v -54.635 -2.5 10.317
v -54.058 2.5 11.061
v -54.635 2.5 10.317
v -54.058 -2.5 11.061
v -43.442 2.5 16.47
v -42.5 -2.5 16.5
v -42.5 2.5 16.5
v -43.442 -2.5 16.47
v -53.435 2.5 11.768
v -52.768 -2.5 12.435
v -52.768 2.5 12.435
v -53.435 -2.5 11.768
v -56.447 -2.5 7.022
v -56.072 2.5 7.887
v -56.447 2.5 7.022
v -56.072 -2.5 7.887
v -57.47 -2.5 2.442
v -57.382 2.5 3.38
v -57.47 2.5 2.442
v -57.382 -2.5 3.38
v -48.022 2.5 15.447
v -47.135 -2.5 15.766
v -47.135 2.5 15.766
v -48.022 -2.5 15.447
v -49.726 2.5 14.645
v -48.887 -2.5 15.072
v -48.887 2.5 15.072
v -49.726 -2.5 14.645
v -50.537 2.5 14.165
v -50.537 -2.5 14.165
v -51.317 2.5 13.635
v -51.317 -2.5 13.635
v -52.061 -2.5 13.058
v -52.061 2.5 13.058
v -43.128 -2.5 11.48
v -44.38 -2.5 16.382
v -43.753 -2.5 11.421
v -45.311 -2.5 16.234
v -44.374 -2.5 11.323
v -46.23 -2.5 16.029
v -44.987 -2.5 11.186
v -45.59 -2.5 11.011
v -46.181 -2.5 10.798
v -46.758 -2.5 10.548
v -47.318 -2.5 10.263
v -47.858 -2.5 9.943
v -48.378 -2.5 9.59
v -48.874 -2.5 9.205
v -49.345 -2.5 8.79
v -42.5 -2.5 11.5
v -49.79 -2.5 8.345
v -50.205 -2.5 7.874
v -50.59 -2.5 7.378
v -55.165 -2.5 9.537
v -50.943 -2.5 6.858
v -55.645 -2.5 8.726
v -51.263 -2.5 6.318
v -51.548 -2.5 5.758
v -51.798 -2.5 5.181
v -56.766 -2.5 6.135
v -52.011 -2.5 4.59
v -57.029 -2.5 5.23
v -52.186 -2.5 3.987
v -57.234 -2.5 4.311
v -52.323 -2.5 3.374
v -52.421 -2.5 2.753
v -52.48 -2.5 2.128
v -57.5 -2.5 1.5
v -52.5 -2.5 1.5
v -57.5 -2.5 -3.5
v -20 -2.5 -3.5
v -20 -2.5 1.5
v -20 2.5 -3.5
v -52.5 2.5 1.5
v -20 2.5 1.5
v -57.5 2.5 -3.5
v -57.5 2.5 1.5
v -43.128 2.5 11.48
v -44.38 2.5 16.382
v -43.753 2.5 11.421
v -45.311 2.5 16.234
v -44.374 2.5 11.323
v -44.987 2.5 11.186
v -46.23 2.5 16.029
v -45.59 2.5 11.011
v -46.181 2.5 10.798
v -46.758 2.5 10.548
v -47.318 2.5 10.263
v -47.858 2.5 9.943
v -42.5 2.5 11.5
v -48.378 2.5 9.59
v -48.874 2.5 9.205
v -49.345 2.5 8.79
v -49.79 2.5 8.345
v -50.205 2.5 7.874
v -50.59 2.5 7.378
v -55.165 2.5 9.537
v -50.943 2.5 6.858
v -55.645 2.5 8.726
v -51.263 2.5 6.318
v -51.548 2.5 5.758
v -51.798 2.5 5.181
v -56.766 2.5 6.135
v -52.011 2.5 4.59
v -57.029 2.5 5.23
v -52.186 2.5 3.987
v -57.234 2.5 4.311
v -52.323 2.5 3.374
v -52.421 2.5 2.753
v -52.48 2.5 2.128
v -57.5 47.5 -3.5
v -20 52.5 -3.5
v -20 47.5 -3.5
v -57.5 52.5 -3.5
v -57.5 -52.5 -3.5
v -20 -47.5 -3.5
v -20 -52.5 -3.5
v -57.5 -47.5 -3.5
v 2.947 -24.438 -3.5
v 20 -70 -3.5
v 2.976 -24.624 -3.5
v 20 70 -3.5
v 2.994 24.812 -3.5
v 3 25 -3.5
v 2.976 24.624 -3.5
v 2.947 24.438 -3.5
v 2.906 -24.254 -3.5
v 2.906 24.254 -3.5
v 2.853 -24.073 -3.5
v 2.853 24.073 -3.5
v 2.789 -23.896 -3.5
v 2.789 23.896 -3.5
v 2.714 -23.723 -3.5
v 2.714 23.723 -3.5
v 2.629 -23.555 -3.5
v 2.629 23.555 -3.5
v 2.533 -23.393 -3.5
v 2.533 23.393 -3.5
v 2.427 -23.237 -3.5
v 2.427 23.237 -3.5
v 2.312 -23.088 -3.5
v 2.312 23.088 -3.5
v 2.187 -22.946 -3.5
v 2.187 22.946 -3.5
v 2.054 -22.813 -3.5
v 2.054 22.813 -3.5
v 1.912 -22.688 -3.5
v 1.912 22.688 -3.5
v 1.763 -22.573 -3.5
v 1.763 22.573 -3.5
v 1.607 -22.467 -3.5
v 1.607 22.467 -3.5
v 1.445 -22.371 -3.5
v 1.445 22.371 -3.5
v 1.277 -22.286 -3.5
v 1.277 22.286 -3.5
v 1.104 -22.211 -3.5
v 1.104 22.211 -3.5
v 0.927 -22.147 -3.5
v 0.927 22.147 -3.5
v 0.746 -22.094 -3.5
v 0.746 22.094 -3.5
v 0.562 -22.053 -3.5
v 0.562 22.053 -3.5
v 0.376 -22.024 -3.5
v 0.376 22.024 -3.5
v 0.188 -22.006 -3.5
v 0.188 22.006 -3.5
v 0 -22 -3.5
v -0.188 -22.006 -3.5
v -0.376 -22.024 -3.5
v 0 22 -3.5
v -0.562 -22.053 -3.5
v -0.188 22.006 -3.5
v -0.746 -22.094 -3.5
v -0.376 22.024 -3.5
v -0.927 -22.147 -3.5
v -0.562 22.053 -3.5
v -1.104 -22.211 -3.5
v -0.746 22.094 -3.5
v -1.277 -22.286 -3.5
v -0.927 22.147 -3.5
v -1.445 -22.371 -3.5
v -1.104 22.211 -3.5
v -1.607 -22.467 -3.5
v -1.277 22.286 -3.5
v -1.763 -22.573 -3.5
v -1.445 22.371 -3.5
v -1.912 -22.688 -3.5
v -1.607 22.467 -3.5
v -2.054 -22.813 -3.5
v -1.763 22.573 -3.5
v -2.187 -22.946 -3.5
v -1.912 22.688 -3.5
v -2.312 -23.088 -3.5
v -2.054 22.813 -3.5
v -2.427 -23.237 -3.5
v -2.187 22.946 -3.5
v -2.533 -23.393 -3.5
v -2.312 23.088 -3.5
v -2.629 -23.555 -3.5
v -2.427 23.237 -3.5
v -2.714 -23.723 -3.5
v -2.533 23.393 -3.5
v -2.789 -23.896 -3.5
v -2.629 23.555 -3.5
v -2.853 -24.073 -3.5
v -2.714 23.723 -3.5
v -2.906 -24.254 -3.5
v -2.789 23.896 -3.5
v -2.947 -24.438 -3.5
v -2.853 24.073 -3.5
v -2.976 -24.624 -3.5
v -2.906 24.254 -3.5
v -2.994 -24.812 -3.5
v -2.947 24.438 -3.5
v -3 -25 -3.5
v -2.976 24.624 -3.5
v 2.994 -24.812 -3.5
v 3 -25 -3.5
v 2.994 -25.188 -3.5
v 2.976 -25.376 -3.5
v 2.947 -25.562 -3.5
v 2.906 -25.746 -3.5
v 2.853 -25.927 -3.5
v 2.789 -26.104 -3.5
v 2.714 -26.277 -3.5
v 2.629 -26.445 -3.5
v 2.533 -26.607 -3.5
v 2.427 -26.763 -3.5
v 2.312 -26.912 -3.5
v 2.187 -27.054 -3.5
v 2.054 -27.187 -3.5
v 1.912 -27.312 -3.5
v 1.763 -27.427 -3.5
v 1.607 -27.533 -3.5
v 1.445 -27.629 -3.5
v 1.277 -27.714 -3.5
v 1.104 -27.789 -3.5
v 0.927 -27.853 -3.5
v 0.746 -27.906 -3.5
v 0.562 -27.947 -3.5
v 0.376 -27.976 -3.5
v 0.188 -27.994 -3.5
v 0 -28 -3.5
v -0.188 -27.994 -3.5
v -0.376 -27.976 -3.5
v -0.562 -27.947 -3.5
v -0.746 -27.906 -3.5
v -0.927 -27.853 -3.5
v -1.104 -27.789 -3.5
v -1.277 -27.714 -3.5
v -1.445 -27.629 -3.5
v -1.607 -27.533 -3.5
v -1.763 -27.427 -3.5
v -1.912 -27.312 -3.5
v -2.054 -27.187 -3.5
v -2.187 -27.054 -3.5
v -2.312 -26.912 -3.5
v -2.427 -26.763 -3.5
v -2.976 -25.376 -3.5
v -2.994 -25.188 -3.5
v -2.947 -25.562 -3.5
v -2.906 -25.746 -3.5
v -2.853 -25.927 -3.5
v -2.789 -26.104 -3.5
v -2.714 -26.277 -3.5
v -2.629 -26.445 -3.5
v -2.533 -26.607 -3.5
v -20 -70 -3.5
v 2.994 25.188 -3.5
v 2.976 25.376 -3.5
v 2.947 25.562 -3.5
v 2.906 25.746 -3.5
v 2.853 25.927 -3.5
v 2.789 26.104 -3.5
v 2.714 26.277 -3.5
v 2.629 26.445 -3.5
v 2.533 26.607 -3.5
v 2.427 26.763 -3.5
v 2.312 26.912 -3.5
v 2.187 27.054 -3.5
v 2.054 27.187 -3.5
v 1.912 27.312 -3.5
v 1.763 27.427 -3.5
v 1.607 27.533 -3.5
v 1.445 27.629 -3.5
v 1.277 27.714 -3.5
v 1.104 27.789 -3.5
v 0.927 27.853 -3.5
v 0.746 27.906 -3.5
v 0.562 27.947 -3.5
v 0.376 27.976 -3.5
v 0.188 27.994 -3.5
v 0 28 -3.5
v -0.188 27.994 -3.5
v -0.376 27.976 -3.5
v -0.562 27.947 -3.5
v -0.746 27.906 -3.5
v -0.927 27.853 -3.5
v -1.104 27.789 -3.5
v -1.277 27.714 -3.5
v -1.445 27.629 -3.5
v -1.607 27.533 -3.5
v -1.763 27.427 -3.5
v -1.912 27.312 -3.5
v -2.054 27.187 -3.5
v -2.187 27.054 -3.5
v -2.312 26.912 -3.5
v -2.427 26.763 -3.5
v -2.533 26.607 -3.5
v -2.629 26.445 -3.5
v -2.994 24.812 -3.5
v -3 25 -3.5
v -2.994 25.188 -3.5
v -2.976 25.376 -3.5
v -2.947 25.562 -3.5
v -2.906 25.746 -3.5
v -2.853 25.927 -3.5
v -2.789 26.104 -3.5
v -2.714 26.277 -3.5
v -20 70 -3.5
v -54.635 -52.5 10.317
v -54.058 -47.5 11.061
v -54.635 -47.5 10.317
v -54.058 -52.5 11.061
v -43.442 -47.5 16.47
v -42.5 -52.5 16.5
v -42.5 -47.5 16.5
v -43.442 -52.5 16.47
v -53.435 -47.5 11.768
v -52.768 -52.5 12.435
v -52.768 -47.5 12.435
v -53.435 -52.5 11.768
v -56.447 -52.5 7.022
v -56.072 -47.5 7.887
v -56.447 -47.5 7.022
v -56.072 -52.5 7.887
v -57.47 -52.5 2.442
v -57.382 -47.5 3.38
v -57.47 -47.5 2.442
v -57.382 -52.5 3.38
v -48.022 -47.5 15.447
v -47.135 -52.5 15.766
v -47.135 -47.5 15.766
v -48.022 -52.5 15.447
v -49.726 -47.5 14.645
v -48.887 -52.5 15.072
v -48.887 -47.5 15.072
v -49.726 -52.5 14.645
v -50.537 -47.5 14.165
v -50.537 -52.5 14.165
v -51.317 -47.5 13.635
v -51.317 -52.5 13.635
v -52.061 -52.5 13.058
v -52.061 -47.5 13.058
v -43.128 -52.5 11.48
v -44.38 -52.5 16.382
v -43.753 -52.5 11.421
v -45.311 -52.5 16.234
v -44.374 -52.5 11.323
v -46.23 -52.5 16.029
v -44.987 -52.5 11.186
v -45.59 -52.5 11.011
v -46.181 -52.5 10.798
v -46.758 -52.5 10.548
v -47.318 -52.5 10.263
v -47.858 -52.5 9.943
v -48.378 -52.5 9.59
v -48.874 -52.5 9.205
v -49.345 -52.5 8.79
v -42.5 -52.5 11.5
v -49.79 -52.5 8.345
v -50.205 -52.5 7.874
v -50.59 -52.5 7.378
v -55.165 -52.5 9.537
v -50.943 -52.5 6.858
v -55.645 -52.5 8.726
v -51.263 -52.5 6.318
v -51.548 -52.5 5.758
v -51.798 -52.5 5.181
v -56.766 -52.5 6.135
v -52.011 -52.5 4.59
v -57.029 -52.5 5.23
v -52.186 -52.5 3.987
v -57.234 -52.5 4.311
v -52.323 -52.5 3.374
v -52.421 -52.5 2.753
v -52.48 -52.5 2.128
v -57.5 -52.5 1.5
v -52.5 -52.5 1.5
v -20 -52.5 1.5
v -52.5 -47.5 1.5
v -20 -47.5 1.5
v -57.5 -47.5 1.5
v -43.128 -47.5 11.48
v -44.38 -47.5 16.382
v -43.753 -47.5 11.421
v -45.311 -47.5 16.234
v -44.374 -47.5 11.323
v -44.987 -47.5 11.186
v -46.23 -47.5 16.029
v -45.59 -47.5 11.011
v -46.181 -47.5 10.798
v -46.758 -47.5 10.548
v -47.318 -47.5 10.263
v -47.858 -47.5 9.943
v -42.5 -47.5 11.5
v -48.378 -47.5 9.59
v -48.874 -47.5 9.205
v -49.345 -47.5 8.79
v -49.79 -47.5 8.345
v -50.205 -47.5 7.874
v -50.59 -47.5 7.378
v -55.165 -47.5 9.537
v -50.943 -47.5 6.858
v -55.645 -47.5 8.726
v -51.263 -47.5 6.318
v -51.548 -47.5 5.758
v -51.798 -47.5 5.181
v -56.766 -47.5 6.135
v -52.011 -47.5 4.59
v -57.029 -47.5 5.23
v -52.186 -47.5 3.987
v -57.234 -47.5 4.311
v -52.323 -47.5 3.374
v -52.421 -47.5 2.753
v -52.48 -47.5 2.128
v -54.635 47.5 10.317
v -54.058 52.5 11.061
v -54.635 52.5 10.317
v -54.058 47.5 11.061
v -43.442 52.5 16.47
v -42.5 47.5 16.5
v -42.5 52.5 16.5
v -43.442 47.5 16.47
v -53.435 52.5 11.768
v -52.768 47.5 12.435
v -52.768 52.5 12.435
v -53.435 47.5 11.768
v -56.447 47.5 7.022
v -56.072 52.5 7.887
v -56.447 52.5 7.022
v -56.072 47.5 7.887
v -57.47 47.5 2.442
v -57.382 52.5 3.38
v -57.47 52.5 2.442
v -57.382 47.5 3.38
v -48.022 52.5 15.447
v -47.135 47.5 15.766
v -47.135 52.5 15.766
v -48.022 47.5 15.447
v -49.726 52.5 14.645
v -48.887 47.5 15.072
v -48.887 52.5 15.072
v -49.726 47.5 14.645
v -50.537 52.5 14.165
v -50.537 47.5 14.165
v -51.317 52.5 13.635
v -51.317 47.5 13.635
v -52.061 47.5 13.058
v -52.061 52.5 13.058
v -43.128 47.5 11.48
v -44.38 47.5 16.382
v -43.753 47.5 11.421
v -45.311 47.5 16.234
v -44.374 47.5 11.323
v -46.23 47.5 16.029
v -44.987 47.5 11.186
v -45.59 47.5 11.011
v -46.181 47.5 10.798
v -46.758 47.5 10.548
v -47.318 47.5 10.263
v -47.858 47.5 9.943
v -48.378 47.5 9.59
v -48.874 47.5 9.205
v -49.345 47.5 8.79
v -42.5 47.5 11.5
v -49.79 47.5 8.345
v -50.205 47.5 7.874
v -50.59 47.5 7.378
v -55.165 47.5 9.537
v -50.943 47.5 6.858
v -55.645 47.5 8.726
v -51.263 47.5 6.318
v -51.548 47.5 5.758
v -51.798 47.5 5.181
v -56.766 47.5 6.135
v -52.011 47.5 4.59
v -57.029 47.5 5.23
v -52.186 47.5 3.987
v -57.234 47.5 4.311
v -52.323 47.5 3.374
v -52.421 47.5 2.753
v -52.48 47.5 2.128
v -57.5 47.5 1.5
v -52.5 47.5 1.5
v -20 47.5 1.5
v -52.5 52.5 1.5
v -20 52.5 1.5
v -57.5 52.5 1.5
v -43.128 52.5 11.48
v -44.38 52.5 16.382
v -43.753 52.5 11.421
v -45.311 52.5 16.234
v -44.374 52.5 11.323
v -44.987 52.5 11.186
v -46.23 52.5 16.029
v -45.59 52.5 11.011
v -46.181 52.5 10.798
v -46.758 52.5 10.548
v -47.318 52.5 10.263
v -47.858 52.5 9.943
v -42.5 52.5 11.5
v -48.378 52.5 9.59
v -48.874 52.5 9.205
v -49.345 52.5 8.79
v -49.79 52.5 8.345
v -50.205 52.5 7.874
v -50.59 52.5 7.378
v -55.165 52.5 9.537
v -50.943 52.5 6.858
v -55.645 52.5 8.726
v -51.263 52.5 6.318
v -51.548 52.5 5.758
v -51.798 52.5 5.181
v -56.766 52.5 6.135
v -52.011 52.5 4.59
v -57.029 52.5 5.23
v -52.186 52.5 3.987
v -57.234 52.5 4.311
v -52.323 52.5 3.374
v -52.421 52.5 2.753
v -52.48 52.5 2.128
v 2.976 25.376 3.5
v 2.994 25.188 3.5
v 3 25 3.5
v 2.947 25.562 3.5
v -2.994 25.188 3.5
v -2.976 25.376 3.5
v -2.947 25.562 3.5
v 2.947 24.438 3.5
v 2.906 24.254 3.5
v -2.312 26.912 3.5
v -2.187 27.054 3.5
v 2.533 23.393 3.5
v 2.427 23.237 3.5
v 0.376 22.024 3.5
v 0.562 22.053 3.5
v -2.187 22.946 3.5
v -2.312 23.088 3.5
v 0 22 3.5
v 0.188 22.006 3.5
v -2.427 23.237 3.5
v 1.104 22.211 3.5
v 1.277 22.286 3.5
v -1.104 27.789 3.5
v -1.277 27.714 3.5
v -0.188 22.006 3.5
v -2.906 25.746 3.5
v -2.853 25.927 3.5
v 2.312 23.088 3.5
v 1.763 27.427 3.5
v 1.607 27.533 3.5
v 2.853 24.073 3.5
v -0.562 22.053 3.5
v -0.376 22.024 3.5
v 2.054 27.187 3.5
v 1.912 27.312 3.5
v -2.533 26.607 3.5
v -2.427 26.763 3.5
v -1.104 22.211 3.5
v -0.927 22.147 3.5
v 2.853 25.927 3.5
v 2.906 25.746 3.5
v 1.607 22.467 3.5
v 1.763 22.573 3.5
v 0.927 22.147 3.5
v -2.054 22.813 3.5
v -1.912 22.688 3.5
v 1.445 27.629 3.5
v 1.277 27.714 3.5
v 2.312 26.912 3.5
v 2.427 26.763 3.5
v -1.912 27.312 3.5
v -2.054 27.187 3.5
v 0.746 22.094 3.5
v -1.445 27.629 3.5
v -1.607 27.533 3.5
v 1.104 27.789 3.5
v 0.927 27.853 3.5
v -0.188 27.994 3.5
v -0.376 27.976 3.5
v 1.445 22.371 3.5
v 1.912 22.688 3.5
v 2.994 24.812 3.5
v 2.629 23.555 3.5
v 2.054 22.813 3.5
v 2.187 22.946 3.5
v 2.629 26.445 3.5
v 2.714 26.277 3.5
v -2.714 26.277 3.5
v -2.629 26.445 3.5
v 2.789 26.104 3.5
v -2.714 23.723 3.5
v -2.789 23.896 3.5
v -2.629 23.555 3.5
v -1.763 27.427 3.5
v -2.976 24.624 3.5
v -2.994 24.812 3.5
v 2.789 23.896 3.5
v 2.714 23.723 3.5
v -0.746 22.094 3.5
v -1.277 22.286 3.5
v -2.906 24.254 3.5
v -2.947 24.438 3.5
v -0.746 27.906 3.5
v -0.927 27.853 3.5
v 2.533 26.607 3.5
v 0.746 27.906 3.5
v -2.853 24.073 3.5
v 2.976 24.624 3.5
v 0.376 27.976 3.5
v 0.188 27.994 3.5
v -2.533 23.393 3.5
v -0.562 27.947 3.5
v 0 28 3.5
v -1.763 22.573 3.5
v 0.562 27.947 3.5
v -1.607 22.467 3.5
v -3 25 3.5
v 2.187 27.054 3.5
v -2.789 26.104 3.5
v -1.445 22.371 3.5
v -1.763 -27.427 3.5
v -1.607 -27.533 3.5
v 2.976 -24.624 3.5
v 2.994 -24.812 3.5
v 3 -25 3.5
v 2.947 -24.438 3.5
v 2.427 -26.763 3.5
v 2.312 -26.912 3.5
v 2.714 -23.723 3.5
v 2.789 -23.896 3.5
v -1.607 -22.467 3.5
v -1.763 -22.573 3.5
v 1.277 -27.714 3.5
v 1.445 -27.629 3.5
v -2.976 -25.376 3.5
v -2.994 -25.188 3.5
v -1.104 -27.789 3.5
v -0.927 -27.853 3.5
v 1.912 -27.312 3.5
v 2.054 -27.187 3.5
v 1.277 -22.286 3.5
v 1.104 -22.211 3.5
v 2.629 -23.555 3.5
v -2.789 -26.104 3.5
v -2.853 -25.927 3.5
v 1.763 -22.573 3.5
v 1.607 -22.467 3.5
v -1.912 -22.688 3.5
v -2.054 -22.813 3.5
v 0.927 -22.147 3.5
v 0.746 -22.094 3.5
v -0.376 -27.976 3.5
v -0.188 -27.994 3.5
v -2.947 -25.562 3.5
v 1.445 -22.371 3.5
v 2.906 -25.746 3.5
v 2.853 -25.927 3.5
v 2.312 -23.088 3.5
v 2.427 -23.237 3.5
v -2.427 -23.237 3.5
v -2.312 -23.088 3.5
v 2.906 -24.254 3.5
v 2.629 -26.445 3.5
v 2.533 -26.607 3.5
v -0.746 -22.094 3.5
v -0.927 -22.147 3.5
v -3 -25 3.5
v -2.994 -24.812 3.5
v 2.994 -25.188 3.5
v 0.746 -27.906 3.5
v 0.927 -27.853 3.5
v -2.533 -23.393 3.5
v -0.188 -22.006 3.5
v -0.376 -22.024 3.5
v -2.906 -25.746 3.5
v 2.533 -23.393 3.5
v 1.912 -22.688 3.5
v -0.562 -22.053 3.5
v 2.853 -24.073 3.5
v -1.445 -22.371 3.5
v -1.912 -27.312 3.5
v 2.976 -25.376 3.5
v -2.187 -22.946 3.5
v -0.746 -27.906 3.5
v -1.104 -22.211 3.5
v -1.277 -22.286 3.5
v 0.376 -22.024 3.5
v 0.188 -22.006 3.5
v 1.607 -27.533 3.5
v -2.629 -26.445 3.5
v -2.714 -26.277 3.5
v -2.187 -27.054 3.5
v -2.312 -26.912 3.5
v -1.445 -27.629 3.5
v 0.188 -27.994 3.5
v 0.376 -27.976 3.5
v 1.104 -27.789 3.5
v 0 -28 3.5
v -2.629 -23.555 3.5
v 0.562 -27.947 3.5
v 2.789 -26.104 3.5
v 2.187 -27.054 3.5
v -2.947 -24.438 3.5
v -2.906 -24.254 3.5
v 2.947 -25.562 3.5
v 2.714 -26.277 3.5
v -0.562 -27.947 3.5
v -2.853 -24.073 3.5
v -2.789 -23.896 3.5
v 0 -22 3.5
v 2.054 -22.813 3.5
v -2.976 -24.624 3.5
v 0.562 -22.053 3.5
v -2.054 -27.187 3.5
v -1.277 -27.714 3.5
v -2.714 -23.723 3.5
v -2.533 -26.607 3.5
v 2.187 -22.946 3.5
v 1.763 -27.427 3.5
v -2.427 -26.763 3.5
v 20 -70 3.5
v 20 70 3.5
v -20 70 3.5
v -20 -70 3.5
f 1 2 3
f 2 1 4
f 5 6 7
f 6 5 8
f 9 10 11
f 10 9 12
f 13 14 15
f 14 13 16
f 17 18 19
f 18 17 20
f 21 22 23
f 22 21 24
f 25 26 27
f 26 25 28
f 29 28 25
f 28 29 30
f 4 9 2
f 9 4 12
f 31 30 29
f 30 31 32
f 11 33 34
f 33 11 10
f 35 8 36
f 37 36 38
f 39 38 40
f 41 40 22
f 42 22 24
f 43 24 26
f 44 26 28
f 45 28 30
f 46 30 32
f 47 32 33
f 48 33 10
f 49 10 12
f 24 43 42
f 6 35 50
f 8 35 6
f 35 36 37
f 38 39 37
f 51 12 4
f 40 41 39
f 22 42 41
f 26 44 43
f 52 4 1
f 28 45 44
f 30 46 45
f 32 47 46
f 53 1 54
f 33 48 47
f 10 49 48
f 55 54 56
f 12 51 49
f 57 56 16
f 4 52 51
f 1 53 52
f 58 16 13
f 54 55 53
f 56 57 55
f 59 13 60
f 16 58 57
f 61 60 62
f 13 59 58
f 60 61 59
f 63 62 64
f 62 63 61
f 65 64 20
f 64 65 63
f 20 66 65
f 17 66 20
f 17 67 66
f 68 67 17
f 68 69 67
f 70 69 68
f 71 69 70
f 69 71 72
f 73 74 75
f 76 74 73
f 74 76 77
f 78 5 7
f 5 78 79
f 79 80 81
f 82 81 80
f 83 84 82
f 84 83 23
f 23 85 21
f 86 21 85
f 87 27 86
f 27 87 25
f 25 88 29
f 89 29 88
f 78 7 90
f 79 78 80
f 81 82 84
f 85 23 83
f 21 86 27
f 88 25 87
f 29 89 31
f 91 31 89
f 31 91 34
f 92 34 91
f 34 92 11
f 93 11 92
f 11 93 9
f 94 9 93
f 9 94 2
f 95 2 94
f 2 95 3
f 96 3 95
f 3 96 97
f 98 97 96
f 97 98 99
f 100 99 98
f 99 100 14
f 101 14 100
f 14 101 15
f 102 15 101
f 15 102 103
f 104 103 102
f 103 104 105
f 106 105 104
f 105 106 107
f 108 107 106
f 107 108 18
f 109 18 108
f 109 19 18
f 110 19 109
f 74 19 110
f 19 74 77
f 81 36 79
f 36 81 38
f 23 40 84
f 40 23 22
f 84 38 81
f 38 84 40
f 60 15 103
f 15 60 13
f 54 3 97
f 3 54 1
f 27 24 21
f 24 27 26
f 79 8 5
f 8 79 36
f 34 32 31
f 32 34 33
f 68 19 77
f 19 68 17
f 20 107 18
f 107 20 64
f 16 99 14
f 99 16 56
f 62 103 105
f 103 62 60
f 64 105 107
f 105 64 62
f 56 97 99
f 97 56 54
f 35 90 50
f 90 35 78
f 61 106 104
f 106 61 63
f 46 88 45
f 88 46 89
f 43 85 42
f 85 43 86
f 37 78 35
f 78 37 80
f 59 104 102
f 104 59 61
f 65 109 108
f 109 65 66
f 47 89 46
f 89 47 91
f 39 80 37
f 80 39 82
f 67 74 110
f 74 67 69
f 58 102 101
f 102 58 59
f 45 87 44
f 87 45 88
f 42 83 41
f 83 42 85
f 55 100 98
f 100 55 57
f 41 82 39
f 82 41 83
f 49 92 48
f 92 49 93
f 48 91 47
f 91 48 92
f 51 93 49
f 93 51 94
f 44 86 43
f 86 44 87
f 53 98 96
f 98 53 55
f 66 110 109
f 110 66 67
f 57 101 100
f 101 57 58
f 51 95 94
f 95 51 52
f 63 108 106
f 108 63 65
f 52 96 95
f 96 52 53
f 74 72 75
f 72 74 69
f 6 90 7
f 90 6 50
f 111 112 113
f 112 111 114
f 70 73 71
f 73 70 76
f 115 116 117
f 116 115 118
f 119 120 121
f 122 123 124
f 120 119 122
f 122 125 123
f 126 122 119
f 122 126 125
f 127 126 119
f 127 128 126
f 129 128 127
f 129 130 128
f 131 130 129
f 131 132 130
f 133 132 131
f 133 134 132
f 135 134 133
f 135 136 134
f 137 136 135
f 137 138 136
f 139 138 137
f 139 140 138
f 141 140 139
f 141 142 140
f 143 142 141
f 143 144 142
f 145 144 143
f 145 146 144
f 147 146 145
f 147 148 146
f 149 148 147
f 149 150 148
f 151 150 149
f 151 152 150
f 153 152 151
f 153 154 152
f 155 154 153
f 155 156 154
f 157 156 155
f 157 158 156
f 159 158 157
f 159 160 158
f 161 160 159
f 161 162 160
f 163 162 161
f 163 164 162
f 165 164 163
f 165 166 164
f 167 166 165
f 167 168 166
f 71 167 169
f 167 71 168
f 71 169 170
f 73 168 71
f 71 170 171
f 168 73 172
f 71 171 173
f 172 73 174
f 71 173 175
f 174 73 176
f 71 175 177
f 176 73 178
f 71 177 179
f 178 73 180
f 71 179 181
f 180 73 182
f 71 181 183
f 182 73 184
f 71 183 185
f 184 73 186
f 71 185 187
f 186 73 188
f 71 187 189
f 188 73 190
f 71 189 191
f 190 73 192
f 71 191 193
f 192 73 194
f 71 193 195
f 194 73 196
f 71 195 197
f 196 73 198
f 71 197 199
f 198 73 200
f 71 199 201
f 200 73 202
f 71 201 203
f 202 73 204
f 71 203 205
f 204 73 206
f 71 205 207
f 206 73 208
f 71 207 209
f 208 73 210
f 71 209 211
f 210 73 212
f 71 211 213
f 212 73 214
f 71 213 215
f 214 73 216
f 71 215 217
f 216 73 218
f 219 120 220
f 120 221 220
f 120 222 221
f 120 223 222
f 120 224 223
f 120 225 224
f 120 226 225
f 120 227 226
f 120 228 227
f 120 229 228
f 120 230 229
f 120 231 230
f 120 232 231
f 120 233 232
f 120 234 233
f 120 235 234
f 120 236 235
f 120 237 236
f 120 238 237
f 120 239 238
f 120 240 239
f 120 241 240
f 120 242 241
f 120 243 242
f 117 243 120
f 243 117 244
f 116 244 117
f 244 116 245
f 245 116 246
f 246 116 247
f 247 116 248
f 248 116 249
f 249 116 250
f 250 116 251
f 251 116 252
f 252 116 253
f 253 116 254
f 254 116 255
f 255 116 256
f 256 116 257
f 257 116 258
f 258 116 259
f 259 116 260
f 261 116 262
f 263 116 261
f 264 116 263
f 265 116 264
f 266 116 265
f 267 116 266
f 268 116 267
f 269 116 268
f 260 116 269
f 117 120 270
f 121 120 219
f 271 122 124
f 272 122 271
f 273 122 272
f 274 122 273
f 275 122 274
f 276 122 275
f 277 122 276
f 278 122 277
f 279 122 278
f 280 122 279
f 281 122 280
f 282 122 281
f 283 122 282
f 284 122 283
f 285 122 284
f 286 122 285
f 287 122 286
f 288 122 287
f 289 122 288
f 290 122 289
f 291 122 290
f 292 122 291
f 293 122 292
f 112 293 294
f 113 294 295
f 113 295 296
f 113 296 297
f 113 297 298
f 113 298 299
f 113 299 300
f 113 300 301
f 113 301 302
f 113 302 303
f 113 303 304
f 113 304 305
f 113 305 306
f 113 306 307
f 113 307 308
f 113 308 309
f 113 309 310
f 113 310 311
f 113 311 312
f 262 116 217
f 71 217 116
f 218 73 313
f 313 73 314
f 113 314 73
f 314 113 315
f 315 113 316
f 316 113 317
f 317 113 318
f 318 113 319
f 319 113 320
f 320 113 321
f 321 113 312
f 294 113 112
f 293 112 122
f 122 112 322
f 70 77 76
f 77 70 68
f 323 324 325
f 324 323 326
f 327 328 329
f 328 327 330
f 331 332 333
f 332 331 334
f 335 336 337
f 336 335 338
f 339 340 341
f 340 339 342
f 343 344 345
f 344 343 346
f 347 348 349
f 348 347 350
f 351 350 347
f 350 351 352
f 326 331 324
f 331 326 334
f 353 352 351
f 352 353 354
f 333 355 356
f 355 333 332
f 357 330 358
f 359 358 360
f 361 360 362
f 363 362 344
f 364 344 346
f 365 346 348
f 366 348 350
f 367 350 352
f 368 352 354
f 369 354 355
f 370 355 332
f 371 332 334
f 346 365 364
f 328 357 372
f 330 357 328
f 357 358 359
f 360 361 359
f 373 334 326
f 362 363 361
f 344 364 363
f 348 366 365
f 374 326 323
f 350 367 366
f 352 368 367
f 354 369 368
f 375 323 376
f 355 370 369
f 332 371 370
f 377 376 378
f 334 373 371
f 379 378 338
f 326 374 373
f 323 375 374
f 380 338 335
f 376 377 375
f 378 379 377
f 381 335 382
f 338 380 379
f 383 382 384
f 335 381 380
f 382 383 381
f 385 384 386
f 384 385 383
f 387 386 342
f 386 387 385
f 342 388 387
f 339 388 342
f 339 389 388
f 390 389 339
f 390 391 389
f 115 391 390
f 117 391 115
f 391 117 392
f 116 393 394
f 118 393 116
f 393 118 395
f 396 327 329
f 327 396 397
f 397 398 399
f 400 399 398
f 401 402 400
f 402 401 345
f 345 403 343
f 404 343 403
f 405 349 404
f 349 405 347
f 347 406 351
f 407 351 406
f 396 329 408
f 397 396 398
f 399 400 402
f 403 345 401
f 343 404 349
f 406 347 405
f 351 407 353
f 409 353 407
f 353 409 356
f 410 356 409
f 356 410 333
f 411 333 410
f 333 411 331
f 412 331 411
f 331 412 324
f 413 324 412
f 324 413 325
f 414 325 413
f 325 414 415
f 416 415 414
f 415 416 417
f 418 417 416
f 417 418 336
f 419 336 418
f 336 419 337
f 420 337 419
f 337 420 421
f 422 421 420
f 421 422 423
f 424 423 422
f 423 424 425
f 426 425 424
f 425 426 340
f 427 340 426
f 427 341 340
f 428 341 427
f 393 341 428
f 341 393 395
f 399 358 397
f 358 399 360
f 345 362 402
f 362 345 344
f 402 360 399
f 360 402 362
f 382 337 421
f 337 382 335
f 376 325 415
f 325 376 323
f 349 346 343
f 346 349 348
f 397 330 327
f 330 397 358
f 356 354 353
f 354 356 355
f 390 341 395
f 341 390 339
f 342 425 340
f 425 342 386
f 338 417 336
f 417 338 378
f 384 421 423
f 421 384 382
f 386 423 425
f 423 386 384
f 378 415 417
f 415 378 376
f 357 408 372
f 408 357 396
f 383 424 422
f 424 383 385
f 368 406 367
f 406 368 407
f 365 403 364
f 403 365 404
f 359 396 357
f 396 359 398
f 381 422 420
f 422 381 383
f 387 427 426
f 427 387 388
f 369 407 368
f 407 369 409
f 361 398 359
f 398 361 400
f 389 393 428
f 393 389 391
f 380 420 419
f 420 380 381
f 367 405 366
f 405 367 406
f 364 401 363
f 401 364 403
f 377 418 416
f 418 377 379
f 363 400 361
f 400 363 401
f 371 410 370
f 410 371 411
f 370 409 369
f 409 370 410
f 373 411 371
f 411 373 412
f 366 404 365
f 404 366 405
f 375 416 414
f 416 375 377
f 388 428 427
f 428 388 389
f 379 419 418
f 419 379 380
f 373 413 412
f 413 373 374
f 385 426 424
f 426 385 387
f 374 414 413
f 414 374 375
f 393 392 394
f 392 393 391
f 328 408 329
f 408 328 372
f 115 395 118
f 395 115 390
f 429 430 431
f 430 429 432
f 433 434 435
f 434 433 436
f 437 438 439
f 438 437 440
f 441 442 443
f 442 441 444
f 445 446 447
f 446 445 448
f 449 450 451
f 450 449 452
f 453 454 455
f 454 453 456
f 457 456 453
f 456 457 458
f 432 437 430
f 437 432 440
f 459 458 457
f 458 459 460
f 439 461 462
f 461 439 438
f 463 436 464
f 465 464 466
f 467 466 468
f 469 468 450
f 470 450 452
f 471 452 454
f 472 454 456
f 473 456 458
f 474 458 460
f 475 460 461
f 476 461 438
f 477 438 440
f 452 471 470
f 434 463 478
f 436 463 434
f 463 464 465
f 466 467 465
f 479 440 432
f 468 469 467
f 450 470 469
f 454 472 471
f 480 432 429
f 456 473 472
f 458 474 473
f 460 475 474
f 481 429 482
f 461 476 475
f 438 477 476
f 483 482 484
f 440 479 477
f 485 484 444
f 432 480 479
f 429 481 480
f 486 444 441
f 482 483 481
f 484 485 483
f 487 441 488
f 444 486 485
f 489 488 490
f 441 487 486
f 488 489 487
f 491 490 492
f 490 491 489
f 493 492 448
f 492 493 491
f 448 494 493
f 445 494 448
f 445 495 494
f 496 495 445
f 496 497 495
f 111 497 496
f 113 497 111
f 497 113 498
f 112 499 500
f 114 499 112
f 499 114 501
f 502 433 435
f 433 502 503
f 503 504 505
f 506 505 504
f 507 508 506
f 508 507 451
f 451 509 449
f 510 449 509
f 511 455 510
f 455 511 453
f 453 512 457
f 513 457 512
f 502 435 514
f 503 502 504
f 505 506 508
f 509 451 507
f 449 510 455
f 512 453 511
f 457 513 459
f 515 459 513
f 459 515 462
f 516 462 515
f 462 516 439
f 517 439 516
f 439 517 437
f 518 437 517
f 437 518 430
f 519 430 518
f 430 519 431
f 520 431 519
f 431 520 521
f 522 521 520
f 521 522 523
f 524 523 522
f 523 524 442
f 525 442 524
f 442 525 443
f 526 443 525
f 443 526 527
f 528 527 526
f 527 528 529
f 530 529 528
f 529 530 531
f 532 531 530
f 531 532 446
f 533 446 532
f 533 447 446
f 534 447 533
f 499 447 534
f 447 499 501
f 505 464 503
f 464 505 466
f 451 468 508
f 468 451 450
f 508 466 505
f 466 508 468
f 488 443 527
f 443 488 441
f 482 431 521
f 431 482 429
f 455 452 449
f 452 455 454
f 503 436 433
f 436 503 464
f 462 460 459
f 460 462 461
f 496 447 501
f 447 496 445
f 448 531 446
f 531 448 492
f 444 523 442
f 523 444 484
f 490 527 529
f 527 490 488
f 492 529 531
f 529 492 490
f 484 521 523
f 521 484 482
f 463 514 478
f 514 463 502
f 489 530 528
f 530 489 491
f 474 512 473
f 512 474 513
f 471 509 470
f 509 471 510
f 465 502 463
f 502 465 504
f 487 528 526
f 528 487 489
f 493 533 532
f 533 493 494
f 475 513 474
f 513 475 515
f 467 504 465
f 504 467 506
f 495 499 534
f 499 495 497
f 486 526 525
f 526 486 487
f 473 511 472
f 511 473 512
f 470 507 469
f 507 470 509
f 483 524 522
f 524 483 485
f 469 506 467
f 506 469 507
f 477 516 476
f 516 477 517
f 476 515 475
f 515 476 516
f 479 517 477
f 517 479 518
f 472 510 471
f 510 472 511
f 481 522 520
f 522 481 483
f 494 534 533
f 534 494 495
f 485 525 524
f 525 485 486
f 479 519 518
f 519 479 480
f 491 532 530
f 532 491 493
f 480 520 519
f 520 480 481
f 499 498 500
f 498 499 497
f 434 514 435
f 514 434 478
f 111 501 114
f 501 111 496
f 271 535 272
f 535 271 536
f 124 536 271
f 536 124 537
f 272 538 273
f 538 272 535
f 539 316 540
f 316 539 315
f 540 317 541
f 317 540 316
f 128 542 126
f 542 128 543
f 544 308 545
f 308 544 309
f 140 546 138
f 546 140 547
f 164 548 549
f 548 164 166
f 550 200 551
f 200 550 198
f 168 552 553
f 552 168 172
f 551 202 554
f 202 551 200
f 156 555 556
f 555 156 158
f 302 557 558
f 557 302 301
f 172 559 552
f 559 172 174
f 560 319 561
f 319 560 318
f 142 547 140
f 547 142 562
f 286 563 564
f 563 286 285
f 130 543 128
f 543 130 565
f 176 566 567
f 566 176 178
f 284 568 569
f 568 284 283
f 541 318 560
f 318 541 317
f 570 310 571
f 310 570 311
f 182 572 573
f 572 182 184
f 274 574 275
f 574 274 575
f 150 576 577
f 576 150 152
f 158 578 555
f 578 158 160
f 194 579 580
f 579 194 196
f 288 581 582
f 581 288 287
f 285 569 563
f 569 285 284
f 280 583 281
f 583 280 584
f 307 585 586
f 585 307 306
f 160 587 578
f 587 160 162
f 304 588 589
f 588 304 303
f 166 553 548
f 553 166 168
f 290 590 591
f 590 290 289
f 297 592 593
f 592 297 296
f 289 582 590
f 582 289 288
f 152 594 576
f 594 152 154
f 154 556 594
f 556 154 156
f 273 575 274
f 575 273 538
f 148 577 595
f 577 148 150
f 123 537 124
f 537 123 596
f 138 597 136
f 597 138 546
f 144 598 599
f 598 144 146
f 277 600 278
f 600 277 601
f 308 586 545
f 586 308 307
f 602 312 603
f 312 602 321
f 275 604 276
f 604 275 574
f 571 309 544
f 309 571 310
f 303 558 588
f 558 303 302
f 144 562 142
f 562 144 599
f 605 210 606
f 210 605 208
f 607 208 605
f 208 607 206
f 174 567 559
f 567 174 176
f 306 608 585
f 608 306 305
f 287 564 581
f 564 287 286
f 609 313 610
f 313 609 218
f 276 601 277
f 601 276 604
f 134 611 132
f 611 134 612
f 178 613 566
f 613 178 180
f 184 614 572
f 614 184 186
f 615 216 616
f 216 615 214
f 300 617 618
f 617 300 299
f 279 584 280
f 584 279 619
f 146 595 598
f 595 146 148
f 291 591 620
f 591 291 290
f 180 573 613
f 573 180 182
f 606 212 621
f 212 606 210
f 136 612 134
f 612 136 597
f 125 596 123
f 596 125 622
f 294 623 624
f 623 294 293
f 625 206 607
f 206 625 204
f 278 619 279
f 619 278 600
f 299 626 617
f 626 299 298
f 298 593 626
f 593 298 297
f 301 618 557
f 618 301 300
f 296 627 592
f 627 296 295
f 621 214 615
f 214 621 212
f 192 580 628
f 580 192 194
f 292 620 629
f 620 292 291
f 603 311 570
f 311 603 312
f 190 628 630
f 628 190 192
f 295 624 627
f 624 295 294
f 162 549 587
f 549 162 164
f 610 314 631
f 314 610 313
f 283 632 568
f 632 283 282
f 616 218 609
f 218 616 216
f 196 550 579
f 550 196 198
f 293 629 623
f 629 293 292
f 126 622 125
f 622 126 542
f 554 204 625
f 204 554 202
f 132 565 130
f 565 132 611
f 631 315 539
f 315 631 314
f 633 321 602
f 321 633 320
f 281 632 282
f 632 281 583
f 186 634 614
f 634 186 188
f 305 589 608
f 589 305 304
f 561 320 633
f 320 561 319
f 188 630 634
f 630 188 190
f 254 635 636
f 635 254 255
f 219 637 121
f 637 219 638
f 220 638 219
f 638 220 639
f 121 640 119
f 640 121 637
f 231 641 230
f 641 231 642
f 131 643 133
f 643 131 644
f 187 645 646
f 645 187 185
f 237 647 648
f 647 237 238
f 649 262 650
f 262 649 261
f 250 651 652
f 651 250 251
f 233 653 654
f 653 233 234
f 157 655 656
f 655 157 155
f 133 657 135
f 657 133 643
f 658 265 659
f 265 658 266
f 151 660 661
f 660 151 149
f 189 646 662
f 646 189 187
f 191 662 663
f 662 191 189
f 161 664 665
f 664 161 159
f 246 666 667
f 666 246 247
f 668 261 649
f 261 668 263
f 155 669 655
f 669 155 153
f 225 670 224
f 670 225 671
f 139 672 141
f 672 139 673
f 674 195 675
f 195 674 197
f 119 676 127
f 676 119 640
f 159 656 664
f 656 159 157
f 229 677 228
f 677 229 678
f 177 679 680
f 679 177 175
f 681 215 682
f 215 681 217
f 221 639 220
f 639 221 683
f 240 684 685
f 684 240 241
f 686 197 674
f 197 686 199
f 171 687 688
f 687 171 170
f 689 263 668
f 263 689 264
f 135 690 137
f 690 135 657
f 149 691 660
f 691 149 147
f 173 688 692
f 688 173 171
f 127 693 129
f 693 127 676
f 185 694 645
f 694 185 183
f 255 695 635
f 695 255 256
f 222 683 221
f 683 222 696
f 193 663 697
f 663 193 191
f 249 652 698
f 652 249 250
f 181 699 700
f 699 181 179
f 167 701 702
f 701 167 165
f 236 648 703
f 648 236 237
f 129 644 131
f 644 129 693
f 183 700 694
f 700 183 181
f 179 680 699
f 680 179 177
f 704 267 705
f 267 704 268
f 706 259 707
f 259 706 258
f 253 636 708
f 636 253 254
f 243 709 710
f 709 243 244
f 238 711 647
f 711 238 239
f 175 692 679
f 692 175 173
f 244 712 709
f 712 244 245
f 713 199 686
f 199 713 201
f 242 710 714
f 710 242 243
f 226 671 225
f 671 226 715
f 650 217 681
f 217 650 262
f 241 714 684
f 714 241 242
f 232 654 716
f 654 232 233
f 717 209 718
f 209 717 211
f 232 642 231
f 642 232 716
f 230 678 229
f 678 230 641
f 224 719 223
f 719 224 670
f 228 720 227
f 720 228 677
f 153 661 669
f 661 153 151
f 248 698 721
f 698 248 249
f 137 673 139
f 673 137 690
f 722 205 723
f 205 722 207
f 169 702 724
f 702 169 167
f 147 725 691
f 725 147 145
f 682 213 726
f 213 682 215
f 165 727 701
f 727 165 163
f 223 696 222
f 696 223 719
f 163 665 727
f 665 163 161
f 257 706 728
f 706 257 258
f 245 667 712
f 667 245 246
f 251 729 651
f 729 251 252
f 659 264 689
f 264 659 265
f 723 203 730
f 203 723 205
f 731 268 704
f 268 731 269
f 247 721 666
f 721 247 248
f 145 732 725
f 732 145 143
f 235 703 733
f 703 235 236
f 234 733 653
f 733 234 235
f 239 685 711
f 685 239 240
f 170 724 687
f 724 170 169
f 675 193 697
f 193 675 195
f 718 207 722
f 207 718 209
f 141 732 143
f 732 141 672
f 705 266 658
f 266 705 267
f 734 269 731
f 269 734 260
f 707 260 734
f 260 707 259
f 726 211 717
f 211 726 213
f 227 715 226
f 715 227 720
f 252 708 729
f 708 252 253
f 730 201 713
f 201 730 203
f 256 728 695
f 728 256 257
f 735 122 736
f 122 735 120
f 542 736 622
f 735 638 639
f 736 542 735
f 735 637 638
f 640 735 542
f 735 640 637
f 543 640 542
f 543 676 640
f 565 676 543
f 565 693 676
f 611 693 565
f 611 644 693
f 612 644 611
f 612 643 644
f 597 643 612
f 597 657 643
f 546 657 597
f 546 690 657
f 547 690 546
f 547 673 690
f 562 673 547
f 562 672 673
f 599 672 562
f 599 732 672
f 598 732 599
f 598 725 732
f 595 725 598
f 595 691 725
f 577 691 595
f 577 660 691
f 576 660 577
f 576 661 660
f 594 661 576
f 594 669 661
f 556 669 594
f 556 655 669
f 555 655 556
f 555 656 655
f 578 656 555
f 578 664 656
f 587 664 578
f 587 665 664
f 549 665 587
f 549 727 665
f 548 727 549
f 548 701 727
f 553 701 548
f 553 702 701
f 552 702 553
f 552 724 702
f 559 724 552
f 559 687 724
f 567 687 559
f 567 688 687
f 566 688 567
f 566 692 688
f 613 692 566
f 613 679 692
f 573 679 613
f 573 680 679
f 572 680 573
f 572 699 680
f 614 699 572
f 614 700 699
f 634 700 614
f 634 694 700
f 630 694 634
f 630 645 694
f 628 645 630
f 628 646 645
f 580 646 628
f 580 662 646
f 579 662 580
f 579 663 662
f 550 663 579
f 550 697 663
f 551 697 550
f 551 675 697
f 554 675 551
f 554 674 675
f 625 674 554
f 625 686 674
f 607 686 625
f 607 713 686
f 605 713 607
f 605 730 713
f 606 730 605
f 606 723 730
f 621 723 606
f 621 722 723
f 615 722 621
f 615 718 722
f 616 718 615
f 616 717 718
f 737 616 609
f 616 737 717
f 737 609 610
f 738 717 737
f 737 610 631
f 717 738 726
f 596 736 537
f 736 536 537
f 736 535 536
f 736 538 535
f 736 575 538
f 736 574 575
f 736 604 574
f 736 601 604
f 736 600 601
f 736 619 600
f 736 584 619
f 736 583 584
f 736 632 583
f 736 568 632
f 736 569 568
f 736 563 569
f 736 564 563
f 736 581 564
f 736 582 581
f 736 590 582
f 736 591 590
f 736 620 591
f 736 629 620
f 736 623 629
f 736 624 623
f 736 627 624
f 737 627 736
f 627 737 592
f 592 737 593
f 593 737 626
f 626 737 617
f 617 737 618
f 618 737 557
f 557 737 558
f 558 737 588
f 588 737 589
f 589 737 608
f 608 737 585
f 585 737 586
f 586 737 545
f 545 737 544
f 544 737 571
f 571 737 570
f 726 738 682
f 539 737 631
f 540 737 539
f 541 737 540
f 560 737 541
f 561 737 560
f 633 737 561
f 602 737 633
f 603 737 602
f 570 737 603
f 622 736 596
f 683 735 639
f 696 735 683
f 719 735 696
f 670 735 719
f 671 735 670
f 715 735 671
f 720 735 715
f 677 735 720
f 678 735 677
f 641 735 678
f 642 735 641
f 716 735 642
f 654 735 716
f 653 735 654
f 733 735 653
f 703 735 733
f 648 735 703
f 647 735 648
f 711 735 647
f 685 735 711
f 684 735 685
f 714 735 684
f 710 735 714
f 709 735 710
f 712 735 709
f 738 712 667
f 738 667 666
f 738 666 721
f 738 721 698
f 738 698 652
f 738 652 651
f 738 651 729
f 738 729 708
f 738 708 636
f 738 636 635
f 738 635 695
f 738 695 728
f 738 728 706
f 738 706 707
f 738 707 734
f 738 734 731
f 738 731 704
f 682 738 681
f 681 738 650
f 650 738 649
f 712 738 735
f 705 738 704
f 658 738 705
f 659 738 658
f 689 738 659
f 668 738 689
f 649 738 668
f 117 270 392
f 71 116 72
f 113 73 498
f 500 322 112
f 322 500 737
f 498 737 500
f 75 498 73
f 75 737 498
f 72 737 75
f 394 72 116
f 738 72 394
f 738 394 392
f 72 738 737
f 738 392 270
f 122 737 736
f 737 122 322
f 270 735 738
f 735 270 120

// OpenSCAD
$fn = 100;
union()
{
  difference()
  {
    difference()
    {
      cube(size = [40, 140, 7], center = true);
      translate(v = [-30, 0, 0])
      {
        translate(v = [0, 0, -1])
        {
          union()
          {
            union()
            {
              cube(size = [55, 5, 5], center = true);
              translate(v = [0, 0, 10])
              {
                translate(v = [-20, 0, 0])
                {
                  rotate(a = [0, 90, 0], v = undef)
                  {
                    translate(v = [0, 0, 7.5])
                    {
                      translate(v = [7.5, 0, 0])
                      {
                        difference()
                        {
                          rotate(a = [90, 0, 0], v = undef)
                          {
                            cylinder(h = 5, r = 15, center = true);
                          }
                          rotate(a = [90, 0, 0], v = undef)
                          {
                            cylinder(h = 5.03, r = 10, center = true);
                          }
                          translate(v = [15, 0, 0])
                          {
                            cube(size = [30, 30, 30], center = true);
                          }
                          translate(v = [0, 0, 15])
                          {
                            cube(size = [30, 30, 30], center = true);
                          }
                        }
                      }
                    }
                  }
                }
              }
            }
            translate(v = [0, -50, 0])
            {
              union()
              {
                cube(size = [55, 5, 5], center = true);
                translate(v = [0, 0, 10])
                {
                  translate(v = [-20, 0, 0])
                  {
                    rotate(a = [0, 90, 0], v = undef)
                    {
                      translate(v = [0, 0, 7.5])
                      {
                        translate(v = [7.5, 0, 0])
                        {
                          difference()
                          {
                            rotate(a = [90, 0, 0], v = undef)
                            {
                              cylinder(h = 5, r = 15, center = true);
                            }
                            rotate(a = [90, 0, 0], v = undef)
                            {
                              cylinder(h = 5.03, r = 10, center = true);
                            }
                            translate(v = [15, 0, 0])
                            {
                              cube(size = [30, 30, 30], center = true);
                            }
                            translate(v = [0, 0, 15])
                            {
                              cube(size = [30, 30, 30], center = true);
                            }
                          }
                        }
                      }
                    }
                  }
                }
              }
            }
            translate(v = [0, 50, 0])
            {
              union()
              {
                cube(size = [55, 5, 5], center = true);
                translate(v = [0, 0, 10])
                {
                  translate(v = [-20, 0, 0])
                  {
                    rotate(a = [0, 90, 0], v = undef)
                    {
                      translate(v = [0, 0, 7.5])
                      {
                        translate(v = [7.5, 0, 0])
                        {
                          difference()
                          {
                            rotate(a = [90, 0, 0], v = undef)
                            {
                              cylinder(h = 5, r = 15, center = true);
                            }
                            rotate(a = [90, 0, 0], v = undef)
                            {
                              cylinder(h = 5.03, r = 10, center = true);
                            }
                            translate(v = [15, 0, 0])
                            {
                              cube(size = [30, 30, 30], center = true);
                            }
                            translate(v = [0, 0, 15])
                            {
                              cube(size = [30, 30, 30], center = true);
                            }
                          }
                        }
                      }
                    }
                  }
                }
              }
            }
          }
        }
      }
      union()
      {
        translate(v = [0, 25, 0])
        {
          cylinder(h = 20, r = 3, center = true);
        }
        translate(v = [0, -25, 0])
        {
          cylinder(h = 20, r = 3, center = true);
        }
      }
    }
  }
  translate(v = [-30, 0, 0])
  {
    translate(v = [0, 0, -1])
    {
      union()
      {
        union()
        {
          cube(size = [55, 5, 5], center = true);
          translate(v = [0, 0, 10])
          {
            translate(v = [-20, 0, 0])
            {
              rotate(a = [0, 90, 0], v = undef)
              {
                translate(v = [0, 0, 7.5])
                {
                  translate(v = [7.5, 0, 0])
                  {
                    difference()
                    {
                      rotate(a = [90, 0, 0], v = undef)
                      {
                        cylinder(h = 5, r = 15, center = true);
                      }
                      rotate(a = [90, 0, 0], v = undef)
                      {
                        cylinder(h = 5.03, r = 10, center = true);
                      }
                      translate(v = [15, 0, 0])
                      {
                        cube(size = [30, 30, 30], center = true);
                      }
                      translate(v = [0, 0, 15])
                      {
                        cube(size = [30, 30, 30], center = true);
                      }
                    }
                  }
                }
              }
            }
          }
        }
        translate(v = [0, -50, 0])
        {
          union()
          {
            cube(size = [55, 5, 5], center = true);
            translate(v = [0, 0, 10])
            {
              translate(v = [-20, 0, 0])
              {
                rotate(a = [0, 90, 0], v = undef)
                {
                  translate(v = [0, 0, 7.5])
                  {
                    translate(v = [7.5, 0, 0])
                    {
                      difference()
                      {
                        rotate(a = [90, 0, 0], v = undef)
                        {
                          cylinder(h = 5, r = 15, center = true);
                        }
                        rotate(a = [90, 0, 0], v = undef)
                        {
                          cylinder(h = 5.03, r = 10, center = true);
                        }
                        translate(v = [15, 0, 0])
                        {
                          cube(size = [30, 30, 30], center = true);
                        }
                        translate(v = [0, 0, 15])
                        {
                          cube(size = [30, 30, 30], center = true);
                        }
                      }
                    }
                  }
                }
              }
            }
          }
        }
        translate(v = [0, 50, 0])
        {
          union()
          {
            cube(size = [55, 5, 5], center = true);
            translate(v = [0, 0, 10])
            {
              translate(v = [-20, 0, 0])
              {
                rotate(a = [0, 90, 0], v = undef)
                {
                  translate(v = [0, 0, 7.5])
                  {
                    translate(v = [7.5, 0, 0])
                    {
                      difference()
                      {
                        rotate(a = [90, 0, 0], v = undef)
                        {
                          cylinder(h = 5, r = 15, center = true);
                        }
                        rotate(a = [90, 0, 0], v = undef)
                        {
                          cylinder(h = 5.03, r = 10, center = true);
                        }
                        translate(v = [15, 0, 0])
                        {
                          cube(size = [30, 30, 30], center = true);
                        }
                        translate(v = [0, 0, 15])
                        {
                          cube(size = [30, 30, 30], center = true);
                        }
                      }
                    }
                  }
                }
              }
            }
          }
        }
      }
    }
  }
}
